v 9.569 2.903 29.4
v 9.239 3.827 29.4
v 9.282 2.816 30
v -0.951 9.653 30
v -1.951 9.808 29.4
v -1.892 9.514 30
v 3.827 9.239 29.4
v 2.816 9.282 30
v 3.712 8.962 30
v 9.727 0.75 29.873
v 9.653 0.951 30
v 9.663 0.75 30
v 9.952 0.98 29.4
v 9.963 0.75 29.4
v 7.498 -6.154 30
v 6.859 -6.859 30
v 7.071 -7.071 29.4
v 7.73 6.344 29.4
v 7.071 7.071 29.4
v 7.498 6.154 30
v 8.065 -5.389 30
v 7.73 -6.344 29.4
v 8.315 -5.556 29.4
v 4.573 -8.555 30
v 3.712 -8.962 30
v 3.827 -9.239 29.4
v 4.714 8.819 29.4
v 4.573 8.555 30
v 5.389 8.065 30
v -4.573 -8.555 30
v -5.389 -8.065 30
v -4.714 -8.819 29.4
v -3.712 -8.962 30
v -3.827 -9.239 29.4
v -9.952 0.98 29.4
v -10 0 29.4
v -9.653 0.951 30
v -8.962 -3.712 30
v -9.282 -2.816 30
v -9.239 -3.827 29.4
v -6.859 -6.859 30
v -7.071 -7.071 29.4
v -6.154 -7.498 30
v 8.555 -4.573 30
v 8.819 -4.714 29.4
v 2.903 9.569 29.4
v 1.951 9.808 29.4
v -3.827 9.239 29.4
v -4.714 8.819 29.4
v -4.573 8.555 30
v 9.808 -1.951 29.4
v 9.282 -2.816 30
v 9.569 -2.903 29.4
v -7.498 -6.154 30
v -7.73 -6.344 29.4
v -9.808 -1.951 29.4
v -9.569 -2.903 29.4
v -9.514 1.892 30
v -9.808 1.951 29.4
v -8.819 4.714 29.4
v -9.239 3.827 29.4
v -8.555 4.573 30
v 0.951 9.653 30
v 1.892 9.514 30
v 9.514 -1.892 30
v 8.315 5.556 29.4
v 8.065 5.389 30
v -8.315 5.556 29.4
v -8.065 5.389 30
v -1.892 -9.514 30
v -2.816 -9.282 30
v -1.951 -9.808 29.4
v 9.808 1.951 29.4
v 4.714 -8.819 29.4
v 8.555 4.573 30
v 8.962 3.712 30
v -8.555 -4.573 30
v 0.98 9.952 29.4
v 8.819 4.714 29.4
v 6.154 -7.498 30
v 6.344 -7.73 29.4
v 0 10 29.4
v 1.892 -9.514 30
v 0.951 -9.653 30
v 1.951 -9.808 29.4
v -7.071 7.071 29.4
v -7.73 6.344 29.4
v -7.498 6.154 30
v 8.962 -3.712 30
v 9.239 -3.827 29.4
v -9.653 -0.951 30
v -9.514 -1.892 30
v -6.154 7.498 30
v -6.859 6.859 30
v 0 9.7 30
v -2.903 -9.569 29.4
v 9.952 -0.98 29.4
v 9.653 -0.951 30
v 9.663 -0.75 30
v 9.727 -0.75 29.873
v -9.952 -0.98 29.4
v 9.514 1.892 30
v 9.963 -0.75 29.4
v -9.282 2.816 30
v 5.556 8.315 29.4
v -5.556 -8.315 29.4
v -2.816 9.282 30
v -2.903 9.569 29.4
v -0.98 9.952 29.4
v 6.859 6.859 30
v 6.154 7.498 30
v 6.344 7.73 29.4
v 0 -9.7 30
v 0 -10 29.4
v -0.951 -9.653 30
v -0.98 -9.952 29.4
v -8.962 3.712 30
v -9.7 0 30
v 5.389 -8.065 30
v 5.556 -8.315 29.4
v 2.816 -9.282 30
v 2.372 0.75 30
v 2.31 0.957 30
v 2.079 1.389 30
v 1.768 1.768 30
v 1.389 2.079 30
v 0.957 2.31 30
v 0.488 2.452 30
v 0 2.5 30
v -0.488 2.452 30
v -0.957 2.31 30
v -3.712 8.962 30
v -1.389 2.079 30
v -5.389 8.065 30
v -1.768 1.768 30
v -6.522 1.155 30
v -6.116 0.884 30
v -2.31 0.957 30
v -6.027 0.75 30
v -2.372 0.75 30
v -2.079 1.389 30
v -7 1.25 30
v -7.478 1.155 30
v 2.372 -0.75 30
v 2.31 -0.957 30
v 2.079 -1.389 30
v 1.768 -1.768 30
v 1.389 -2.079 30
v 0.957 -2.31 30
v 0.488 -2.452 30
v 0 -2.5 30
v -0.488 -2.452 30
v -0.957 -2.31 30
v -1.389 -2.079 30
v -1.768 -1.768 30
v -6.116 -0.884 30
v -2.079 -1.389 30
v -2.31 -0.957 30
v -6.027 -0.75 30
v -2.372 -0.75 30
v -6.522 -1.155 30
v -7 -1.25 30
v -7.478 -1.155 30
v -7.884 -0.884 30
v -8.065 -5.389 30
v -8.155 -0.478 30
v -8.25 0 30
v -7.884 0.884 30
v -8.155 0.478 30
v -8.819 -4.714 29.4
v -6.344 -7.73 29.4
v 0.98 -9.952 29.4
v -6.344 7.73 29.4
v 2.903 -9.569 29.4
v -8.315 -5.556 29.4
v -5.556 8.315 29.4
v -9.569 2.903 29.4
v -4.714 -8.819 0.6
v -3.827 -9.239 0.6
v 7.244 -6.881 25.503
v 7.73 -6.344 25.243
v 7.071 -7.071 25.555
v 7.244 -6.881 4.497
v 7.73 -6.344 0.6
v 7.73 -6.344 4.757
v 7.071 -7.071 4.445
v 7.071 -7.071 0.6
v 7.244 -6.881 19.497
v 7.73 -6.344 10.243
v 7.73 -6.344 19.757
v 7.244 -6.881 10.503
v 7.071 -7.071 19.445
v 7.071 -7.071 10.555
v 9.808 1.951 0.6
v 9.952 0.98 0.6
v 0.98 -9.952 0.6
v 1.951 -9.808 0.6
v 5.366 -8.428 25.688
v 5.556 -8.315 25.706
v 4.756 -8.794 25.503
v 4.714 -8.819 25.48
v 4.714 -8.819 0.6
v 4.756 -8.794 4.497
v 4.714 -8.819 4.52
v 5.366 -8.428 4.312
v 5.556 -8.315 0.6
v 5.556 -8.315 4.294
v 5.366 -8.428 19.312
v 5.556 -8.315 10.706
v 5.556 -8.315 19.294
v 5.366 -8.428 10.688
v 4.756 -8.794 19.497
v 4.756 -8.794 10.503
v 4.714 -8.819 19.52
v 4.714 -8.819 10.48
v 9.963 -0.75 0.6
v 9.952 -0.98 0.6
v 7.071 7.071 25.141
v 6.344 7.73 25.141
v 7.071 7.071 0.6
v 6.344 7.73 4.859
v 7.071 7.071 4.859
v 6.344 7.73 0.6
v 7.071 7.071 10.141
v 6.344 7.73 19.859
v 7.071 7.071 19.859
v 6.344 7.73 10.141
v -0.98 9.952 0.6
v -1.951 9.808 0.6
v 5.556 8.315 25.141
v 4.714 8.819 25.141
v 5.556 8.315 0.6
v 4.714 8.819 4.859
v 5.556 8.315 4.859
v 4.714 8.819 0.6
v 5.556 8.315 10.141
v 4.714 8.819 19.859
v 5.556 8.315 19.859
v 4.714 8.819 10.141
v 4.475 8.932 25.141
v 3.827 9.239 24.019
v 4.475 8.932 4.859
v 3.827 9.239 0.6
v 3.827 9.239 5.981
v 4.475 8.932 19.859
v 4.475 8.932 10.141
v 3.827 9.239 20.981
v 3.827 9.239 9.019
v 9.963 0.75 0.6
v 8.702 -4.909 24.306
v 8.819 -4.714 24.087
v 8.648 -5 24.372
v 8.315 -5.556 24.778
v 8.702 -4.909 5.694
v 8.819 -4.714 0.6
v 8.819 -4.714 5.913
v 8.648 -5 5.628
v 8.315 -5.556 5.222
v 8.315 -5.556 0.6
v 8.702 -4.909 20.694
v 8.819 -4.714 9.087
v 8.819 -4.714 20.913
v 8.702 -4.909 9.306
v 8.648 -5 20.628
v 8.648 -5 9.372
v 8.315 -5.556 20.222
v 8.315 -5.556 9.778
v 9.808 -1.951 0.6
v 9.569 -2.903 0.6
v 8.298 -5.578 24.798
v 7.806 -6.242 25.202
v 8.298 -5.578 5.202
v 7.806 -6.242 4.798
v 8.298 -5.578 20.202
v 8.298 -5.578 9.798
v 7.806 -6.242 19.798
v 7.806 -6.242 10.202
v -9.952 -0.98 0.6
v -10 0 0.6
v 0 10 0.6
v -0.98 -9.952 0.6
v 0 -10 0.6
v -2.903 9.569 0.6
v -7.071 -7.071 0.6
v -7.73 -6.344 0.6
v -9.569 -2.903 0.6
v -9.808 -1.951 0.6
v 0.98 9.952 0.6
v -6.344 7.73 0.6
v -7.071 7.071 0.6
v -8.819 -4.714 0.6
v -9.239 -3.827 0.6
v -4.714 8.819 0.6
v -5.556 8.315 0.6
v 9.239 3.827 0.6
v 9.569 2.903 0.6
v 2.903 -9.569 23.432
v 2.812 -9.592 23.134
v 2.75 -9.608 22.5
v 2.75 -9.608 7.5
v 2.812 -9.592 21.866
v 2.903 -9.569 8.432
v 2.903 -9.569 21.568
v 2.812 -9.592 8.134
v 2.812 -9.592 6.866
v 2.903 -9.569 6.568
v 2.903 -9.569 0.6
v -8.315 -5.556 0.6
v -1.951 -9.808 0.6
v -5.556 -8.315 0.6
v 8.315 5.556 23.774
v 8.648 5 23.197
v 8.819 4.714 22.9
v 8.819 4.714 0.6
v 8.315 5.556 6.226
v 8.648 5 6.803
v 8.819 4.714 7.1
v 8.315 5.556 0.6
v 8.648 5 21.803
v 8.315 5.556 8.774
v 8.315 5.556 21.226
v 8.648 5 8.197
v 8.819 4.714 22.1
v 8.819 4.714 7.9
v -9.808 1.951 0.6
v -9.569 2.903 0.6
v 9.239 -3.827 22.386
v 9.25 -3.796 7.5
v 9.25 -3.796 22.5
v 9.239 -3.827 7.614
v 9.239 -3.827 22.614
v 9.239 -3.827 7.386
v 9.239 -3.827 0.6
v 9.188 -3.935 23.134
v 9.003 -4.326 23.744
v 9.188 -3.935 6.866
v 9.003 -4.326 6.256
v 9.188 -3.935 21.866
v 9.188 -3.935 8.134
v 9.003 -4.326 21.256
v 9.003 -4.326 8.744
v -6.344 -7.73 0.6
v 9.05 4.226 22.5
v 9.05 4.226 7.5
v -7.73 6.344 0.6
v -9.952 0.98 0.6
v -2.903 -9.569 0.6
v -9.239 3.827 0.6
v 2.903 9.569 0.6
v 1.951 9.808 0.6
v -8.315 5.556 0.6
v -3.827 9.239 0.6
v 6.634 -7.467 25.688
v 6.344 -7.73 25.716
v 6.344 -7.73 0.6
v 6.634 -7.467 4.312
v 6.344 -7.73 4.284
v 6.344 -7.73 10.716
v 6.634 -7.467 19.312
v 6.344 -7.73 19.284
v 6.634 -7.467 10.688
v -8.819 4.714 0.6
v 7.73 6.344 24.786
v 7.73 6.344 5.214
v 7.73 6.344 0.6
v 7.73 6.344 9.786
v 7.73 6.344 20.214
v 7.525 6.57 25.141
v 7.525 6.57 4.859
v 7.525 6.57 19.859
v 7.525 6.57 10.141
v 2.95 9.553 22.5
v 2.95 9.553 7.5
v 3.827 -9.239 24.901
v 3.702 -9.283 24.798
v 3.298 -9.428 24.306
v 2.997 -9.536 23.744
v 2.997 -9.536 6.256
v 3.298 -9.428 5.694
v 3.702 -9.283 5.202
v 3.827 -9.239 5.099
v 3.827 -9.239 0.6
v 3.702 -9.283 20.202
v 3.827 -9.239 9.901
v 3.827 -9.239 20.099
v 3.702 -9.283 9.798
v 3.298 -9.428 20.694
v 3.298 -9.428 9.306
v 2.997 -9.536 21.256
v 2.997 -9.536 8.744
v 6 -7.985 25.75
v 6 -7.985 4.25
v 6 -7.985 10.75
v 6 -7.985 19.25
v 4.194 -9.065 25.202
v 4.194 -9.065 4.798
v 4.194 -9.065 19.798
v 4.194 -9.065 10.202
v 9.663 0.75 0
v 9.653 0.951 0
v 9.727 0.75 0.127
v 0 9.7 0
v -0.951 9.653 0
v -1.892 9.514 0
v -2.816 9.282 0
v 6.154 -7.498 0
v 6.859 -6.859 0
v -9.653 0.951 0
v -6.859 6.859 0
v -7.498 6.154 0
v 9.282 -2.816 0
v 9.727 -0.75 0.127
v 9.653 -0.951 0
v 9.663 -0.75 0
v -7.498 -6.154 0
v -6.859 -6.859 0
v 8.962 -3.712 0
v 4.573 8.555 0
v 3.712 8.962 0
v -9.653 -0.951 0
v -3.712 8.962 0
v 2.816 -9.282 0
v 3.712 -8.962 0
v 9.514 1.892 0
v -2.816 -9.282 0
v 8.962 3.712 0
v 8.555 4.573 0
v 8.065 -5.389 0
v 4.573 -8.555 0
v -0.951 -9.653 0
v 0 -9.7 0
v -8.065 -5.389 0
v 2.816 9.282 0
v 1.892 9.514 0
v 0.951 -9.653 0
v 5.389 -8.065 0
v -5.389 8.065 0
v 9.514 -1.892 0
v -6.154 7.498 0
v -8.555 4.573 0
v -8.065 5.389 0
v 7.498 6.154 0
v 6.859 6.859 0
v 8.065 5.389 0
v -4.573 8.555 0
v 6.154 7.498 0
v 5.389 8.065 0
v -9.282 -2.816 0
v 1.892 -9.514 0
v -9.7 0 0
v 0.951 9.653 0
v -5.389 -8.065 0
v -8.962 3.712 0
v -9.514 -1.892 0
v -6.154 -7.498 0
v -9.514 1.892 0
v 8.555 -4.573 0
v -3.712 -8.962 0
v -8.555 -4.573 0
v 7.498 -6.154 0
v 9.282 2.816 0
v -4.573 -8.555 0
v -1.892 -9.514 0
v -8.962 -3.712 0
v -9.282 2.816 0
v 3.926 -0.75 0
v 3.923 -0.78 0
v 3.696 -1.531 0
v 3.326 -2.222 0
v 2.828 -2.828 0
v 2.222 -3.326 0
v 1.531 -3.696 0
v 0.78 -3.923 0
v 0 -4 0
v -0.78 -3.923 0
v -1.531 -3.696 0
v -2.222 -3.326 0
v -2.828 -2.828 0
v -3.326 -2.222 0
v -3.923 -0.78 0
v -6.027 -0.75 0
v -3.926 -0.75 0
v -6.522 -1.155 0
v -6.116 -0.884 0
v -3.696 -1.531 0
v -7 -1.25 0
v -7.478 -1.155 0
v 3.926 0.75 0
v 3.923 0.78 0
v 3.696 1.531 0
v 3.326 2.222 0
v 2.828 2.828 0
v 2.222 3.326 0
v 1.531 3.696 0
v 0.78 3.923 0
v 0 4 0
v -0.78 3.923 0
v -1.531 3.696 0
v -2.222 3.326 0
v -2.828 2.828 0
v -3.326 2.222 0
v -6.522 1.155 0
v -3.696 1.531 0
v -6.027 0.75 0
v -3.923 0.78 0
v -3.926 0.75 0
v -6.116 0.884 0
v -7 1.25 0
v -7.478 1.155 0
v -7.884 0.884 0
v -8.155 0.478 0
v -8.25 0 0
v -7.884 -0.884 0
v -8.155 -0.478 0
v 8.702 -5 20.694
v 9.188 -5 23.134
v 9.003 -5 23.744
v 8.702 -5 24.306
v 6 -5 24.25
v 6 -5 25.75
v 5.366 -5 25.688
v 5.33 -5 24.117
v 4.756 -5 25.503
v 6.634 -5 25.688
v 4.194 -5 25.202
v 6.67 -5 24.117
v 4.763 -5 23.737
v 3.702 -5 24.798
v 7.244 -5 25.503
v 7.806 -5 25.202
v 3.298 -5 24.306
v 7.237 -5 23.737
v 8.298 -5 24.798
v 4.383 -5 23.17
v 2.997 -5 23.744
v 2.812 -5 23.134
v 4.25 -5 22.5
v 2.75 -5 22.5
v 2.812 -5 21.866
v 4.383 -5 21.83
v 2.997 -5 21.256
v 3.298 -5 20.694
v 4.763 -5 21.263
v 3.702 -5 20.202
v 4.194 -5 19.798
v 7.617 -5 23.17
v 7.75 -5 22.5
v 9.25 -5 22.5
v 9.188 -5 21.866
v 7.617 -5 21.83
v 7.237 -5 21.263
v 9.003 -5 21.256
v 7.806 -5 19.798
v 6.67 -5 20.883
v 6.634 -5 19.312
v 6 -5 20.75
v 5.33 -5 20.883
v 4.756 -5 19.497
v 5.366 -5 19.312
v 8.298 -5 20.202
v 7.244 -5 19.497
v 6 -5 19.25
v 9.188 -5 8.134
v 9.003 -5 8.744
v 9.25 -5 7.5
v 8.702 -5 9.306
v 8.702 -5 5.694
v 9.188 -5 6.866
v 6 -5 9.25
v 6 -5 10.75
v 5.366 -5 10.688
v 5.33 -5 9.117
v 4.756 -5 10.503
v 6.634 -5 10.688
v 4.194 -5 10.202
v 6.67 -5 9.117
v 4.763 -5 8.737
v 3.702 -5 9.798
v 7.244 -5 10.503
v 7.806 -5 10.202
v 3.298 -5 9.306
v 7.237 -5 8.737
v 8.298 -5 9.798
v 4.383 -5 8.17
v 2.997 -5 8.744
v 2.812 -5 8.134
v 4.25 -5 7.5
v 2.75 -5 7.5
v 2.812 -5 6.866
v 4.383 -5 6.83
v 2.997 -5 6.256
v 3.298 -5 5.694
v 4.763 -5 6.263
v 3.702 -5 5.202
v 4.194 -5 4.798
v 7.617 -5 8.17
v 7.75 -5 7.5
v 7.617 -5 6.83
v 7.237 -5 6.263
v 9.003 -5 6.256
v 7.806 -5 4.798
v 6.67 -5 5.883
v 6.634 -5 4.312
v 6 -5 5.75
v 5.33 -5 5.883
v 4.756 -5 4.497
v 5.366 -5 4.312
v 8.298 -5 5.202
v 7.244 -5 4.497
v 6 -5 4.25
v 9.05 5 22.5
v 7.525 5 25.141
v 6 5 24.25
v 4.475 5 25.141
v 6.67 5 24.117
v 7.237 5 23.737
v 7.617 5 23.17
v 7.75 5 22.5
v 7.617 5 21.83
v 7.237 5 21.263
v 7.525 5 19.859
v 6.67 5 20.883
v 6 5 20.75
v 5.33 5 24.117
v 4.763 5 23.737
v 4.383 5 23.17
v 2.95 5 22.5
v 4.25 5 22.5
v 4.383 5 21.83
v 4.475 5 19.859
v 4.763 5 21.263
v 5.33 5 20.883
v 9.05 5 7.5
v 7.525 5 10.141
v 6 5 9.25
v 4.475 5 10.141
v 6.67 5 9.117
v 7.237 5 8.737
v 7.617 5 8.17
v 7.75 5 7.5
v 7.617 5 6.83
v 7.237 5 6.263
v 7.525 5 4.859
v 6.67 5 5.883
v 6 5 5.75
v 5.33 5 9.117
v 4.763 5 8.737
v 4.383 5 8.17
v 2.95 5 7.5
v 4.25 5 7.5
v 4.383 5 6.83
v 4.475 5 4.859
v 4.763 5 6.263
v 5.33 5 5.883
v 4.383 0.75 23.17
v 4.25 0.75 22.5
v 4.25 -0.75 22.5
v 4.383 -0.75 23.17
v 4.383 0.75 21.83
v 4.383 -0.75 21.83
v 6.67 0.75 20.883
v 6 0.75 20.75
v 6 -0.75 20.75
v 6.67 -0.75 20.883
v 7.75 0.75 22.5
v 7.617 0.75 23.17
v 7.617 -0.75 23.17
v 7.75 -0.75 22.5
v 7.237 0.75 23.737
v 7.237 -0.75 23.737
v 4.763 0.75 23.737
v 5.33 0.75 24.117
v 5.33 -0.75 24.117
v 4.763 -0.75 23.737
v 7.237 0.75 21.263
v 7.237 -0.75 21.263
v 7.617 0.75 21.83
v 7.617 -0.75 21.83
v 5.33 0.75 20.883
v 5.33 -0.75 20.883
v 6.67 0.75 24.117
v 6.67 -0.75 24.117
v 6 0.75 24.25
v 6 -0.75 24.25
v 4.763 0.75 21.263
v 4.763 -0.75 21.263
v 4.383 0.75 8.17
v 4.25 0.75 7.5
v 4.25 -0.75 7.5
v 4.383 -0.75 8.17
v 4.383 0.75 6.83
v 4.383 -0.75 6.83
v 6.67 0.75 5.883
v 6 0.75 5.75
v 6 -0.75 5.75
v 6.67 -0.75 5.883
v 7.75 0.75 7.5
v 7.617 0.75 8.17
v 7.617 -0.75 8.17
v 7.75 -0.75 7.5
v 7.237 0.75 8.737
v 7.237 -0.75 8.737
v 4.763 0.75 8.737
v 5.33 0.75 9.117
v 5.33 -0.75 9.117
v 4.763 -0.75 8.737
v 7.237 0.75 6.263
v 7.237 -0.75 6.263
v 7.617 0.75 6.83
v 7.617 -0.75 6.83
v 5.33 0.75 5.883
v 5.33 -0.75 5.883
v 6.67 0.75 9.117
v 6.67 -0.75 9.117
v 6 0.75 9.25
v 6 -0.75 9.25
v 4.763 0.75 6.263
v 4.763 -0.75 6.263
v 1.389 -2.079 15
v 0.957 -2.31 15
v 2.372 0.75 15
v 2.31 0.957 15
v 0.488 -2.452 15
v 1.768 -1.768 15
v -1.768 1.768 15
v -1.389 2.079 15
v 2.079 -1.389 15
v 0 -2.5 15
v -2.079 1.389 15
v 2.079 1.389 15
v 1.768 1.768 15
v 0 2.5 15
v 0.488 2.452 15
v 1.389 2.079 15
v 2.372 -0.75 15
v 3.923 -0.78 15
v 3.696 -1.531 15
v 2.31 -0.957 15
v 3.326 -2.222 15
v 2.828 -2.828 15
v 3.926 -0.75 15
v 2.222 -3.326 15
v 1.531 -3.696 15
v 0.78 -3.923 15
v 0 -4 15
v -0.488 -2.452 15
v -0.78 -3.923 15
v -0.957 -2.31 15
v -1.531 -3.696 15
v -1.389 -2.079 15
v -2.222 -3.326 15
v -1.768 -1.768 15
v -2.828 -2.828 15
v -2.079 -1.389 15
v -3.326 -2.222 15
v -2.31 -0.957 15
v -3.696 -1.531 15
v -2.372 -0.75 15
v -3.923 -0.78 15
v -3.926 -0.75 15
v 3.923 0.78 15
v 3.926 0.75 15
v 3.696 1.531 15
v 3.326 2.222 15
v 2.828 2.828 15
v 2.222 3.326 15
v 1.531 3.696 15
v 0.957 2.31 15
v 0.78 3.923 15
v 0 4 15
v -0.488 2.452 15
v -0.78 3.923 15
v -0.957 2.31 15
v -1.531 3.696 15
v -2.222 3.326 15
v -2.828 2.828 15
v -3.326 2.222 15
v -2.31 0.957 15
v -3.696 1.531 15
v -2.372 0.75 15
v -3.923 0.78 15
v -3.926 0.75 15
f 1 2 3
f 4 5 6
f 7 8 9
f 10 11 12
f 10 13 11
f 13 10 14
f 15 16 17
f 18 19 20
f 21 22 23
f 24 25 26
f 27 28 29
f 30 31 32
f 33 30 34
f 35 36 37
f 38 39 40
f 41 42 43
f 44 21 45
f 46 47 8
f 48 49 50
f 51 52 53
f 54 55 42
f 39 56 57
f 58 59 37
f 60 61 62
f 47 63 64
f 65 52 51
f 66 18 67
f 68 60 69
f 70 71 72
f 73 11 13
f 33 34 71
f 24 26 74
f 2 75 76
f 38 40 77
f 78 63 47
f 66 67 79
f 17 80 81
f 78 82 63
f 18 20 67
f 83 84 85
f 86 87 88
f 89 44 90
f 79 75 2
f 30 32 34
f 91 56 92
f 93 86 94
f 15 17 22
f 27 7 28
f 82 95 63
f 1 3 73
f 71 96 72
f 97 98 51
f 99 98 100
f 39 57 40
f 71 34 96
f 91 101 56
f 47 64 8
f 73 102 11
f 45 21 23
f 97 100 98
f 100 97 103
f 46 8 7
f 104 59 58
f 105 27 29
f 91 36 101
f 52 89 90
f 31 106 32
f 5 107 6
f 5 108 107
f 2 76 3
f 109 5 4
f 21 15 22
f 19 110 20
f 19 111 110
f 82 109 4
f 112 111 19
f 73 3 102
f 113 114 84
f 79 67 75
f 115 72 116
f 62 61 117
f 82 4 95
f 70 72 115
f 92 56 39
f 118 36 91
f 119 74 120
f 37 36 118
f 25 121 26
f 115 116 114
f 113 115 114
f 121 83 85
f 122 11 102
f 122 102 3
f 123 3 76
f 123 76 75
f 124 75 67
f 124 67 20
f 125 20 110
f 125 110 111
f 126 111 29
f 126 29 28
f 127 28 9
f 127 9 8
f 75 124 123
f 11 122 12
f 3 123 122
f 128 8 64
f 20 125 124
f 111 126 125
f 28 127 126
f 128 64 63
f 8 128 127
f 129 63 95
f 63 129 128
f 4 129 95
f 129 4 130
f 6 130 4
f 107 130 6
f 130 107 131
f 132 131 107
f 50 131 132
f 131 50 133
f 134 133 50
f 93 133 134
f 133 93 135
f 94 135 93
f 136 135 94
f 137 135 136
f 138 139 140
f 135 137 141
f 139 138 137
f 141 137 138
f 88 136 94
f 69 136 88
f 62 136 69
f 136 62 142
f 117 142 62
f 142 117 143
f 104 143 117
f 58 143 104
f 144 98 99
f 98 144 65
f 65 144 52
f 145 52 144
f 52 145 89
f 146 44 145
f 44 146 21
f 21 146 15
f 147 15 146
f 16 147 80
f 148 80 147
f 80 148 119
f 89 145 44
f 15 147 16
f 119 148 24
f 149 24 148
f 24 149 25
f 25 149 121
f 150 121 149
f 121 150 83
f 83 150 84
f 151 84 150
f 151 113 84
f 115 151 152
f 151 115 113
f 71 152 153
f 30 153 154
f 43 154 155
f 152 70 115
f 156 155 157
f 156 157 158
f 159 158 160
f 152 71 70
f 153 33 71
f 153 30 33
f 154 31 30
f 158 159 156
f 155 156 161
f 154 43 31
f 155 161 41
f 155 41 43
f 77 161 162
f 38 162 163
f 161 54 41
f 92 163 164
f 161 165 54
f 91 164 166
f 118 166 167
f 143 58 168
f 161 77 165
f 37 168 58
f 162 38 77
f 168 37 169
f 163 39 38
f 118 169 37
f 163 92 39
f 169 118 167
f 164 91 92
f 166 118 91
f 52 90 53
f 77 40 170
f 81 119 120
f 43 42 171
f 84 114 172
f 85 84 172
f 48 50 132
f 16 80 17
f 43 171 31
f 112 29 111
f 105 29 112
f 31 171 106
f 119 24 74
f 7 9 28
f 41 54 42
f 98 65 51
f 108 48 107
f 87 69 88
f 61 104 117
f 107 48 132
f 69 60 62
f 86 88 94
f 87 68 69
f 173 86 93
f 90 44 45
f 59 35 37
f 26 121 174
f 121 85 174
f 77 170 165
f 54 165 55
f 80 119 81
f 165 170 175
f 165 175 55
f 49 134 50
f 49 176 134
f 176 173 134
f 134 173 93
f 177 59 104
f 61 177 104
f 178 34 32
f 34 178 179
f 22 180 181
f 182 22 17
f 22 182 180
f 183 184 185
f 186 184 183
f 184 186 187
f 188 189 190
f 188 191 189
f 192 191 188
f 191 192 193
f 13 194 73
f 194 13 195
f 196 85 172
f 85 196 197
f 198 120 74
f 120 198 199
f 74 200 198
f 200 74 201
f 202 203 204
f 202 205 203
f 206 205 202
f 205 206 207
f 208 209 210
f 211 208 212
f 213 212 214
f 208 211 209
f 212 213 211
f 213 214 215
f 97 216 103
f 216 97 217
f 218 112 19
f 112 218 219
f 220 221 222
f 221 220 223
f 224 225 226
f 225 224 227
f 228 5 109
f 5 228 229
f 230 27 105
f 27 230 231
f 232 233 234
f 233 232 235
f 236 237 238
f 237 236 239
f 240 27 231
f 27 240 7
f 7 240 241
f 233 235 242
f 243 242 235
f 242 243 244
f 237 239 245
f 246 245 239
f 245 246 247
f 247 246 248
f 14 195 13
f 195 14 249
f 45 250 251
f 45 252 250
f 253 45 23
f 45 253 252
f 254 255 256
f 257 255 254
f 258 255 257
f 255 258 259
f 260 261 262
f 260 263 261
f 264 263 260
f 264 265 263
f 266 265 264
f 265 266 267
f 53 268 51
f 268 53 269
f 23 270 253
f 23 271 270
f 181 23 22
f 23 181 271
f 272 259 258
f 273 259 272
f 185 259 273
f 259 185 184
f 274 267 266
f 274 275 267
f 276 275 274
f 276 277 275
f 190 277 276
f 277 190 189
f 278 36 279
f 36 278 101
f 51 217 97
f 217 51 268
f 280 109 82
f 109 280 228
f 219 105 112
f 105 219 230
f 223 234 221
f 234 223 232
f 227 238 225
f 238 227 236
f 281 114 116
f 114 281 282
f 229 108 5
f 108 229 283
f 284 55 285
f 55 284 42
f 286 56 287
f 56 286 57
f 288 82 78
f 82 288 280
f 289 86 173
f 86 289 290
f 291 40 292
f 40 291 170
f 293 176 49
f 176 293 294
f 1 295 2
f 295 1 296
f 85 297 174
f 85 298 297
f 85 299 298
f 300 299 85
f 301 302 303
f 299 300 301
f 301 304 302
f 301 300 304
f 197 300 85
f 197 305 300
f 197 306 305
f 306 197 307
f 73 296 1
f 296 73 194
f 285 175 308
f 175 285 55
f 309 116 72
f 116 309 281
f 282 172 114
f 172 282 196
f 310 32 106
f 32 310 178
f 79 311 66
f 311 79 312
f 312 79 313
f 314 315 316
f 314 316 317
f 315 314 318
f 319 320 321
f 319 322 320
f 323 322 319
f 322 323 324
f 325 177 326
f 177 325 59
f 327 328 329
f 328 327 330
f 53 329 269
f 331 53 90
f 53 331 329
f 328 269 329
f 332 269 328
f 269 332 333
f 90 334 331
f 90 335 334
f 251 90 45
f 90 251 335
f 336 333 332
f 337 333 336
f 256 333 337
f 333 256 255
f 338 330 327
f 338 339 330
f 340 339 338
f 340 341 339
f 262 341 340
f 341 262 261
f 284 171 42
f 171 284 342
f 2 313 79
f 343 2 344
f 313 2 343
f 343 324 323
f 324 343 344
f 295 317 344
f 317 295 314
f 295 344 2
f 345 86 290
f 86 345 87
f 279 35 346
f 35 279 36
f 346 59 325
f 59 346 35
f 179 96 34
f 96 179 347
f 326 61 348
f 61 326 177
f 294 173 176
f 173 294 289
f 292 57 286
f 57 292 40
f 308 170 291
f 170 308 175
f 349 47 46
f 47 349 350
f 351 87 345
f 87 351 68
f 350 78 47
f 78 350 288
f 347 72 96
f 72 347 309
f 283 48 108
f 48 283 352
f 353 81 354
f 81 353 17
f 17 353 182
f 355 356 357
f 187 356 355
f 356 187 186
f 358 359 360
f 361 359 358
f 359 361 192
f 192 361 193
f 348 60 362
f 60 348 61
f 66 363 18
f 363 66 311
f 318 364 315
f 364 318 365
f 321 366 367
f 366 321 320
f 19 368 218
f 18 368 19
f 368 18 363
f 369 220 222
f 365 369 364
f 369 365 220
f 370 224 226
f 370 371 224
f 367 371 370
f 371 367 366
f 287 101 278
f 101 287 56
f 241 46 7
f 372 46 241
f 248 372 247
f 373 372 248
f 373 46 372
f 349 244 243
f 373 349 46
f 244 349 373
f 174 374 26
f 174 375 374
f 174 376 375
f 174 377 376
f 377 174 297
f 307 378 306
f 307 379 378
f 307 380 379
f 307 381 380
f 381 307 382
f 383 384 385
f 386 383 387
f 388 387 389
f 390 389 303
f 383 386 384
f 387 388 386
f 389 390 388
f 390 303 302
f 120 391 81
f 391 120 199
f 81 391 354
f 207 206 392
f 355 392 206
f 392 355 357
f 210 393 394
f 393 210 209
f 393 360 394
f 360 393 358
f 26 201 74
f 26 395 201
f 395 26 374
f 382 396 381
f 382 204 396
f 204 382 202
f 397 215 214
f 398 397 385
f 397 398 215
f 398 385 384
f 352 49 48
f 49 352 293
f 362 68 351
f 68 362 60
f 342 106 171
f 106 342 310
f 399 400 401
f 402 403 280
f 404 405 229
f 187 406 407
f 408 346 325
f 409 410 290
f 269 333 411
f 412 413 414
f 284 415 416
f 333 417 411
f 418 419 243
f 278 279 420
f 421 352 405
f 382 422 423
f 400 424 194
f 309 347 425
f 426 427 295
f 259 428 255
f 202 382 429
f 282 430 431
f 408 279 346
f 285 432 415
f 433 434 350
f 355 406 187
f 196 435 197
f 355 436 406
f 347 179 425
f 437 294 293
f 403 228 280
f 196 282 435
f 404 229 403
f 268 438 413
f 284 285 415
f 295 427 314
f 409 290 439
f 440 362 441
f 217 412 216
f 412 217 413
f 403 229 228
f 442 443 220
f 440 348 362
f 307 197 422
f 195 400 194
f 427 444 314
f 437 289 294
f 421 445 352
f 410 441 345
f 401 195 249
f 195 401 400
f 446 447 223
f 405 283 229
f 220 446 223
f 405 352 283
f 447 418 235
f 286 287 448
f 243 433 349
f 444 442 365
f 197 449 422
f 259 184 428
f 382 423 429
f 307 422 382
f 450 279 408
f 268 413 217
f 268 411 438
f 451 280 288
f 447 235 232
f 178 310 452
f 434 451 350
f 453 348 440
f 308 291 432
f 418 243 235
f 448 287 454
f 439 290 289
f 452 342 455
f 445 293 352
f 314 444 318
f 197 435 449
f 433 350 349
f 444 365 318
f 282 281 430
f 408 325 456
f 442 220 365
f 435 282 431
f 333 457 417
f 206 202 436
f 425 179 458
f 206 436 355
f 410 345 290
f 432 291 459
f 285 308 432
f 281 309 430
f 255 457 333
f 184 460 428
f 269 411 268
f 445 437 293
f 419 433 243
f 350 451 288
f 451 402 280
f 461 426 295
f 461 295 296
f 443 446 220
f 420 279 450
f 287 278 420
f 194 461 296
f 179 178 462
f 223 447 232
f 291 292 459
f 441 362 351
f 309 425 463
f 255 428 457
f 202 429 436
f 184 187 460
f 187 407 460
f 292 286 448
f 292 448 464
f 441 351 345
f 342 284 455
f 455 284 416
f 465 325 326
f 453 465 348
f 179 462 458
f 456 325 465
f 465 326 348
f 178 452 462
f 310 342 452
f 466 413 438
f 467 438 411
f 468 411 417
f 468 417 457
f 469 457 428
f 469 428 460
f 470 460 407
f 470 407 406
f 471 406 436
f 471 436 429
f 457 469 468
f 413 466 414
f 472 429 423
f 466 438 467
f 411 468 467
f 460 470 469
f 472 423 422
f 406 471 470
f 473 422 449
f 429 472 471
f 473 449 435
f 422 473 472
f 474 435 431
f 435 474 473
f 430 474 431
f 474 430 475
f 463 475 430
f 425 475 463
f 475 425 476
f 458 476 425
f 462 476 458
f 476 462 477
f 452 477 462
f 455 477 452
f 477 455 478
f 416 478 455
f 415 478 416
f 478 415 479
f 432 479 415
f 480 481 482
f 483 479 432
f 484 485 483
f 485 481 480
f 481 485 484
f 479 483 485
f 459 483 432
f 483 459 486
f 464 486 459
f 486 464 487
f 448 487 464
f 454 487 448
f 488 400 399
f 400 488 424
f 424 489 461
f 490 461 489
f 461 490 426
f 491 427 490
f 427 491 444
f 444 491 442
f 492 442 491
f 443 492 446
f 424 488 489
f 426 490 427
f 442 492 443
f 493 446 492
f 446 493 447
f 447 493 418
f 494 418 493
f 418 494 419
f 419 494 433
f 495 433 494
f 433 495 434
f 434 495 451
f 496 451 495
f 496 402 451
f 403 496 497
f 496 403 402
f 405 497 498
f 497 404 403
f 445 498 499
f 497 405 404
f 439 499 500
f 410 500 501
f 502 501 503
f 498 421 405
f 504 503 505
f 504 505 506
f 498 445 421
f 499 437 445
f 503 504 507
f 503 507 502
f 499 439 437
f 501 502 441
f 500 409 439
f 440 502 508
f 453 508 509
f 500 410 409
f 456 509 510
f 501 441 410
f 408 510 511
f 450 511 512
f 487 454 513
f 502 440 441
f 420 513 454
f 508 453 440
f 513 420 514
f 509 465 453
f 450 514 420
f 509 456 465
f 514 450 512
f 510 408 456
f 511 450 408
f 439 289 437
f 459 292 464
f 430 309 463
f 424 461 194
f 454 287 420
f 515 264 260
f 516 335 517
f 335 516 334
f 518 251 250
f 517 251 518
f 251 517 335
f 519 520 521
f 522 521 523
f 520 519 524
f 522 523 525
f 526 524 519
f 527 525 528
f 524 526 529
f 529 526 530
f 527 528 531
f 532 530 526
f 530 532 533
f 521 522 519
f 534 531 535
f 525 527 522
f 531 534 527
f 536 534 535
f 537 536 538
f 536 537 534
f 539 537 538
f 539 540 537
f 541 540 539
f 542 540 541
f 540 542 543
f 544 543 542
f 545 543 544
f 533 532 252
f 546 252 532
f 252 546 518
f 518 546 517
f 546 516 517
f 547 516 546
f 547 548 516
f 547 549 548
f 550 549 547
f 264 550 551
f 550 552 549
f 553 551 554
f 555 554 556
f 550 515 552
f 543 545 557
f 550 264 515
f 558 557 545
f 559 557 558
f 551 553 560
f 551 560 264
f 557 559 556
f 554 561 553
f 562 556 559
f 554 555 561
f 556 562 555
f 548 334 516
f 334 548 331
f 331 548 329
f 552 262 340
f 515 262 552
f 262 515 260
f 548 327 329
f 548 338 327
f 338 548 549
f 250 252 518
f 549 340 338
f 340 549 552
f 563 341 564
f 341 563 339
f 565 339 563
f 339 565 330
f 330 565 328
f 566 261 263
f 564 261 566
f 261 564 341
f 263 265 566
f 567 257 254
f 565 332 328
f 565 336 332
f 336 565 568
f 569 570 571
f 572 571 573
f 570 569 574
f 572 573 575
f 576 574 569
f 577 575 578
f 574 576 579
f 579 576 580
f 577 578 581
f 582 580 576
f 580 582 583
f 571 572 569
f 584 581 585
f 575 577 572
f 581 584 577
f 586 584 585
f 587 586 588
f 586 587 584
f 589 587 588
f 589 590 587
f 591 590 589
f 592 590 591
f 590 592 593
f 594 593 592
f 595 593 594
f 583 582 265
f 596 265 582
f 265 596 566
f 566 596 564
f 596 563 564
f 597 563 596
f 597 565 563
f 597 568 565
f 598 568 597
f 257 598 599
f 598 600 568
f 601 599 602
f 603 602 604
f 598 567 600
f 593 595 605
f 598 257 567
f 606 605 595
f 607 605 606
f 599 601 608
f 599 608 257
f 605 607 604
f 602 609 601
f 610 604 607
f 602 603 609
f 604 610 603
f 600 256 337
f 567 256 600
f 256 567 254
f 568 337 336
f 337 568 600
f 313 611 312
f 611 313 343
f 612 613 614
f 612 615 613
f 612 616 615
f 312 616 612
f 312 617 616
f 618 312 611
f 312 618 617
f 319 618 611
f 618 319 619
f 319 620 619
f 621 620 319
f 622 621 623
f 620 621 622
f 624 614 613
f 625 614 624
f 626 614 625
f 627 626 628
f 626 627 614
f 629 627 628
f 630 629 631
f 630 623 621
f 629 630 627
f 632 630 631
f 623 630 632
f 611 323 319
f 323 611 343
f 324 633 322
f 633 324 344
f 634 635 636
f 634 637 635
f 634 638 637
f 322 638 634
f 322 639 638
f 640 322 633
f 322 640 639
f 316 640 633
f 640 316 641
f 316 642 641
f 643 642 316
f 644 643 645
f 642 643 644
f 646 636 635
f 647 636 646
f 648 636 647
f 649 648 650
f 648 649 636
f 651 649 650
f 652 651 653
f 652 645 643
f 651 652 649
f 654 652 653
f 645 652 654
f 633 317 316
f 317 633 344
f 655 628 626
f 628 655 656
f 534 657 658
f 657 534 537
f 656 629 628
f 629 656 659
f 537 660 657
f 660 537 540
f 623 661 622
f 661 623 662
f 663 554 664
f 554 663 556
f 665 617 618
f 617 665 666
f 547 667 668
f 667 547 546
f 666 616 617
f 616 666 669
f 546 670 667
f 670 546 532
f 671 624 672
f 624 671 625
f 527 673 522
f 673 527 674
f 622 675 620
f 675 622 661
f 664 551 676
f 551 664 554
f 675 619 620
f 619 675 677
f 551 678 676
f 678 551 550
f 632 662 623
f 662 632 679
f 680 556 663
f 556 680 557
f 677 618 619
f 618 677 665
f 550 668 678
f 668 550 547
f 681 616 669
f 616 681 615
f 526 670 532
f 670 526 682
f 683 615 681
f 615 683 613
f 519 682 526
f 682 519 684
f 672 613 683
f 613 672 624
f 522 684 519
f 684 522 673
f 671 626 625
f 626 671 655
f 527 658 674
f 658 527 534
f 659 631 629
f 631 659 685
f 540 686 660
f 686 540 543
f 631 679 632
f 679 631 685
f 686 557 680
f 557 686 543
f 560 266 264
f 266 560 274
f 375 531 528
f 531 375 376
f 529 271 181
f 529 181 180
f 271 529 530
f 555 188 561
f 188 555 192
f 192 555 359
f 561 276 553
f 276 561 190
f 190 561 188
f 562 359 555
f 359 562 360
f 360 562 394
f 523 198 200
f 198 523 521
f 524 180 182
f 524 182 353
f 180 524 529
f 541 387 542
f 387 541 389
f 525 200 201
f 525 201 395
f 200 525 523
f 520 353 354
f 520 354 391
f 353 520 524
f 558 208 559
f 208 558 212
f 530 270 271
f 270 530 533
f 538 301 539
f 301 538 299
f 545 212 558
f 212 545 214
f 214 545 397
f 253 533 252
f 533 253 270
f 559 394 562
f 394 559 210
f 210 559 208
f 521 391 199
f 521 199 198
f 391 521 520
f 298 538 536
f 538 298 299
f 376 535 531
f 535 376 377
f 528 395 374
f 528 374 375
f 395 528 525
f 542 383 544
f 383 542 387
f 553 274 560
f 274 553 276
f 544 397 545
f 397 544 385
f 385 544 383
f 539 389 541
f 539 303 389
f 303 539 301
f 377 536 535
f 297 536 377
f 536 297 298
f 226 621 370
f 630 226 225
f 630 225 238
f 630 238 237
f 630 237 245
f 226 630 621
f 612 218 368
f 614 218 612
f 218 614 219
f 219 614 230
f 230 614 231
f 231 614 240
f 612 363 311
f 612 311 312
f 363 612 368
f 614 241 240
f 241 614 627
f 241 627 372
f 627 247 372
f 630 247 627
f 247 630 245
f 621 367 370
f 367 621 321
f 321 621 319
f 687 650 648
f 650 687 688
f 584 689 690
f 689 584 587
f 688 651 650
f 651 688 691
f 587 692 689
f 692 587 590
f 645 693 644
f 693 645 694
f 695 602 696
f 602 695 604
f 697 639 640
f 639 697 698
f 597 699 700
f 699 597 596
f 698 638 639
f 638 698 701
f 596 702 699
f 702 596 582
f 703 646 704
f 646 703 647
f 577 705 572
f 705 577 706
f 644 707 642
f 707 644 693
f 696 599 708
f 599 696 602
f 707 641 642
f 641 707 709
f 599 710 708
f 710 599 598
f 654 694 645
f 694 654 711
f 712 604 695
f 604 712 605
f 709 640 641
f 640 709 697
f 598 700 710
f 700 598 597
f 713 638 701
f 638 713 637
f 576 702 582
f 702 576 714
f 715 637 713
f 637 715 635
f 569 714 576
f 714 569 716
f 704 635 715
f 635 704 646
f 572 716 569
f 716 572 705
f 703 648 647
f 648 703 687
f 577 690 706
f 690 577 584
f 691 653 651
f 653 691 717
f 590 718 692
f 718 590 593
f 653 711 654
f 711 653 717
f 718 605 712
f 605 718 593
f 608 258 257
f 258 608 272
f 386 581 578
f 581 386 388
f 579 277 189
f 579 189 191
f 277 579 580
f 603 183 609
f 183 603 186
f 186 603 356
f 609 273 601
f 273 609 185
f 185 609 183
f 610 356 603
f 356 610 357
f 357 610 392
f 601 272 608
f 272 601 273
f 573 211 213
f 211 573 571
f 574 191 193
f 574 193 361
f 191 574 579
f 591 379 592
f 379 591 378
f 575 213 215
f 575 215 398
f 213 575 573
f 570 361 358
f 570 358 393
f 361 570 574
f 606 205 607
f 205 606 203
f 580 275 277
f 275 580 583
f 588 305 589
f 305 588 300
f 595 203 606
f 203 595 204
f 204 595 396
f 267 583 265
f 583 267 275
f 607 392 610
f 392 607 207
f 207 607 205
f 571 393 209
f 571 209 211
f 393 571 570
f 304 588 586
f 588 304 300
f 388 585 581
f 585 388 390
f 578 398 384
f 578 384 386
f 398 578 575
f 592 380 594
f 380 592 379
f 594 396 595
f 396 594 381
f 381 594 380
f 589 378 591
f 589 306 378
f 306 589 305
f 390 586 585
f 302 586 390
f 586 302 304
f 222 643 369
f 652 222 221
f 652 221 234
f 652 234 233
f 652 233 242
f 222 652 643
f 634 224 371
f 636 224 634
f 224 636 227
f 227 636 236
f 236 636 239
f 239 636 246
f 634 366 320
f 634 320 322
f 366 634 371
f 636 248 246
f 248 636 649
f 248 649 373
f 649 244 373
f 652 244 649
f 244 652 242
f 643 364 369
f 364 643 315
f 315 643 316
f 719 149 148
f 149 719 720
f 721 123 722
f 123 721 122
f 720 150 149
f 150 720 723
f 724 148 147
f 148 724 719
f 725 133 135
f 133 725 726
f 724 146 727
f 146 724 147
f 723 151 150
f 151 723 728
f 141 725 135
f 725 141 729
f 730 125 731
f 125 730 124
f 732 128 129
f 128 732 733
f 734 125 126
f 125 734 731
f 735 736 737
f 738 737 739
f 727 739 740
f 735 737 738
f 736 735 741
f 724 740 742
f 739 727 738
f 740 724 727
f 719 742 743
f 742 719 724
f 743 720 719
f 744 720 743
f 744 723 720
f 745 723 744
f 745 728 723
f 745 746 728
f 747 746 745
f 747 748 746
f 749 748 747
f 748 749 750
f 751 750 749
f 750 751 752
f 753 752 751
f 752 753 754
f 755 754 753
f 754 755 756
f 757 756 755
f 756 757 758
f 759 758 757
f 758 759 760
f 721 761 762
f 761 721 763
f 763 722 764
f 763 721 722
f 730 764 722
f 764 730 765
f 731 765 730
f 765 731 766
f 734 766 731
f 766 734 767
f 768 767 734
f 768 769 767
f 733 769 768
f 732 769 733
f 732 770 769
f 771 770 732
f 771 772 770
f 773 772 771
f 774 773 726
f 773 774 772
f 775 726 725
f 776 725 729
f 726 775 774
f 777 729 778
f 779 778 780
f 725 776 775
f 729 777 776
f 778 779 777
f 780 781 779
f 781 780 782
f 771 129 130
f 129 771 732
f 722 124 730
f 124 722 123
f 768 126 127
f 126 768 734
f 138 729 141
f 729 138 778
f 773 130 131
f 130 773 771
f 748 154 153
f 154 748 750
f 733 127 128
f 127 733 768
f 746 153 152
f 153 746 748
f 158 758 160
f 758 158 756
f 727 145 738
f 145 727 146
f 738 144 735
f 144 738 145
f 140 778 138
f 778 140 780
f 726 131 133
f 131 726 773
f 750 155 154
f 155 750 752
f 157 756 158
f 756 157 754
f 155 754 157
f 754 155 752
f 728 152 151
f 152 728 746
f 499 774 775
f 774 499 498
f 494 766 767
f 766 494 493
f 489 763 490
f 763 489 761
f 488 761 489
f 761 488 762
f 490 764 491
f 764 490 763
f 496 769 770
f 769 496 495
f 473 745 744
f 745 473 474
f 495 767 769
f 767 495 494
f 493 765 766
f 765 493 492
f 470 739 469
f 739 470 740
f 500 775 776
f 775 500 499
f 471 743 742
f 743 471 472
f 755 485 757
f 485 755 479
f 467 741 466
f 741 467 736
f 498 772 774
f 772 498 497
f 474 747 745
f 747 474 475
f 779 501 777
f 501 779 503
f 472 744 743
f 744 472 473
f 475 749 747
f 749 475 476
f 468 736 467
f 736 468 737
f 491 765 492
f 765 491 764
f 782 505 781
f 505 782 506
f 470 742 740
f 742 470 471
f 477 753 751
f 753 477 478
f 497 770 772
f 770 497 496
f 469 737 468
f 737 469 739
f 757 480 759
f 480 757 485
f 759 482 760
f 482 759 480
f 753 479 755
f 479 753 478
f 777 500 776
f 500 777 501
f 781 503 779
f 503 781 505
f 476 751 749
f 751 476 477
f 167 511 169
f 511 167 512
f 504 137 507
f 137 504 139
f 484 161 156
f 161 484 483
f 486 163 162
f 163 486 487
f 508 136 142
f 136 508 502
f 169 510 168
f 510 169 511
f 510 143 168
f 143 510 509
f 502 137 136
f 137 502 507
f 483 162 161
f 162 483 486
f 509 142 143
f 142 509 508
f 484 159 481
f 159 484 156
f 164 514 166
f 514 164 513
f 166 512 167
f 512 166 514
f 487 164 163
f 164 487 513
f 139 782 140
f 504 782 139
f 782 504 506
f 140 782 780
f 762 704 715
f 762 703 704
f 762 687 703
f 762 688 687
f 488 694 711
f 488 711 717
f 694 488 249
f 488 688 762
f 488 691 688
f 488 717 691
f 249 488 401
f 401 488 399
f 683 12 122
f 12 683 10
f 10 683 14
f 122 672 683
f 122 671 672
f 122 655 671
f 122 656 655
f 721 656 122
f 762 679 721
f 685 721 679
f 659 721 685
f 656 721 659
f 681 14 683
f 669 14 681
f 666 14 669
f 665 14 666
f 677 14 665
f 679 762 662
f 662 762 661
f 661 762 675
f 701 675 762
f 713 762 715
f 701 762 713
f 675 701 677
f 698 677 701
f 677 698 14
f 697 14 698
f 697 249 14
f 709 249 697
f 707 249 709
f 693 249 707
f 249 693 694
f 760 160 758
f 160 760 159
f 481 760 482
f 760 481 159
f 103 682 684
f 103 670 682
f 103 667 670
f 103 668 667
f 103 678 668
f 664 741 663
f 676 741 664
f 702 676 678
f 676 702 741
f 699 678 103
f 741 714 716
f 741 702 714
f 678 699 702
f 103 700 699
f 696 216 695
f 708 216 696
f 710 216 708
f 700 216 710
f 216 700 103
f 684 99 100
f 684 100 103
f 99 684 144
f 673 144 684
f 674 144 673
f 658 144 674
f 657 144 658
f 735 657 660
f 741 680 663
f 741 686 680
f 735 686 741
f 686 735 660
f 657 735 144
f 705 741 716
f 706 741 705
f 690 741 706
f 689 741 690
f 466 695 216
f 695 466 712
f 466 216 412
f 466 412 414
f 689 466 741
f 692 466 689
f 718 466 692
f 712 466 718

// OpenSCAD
// overall height
height = 30;
// outer-diameter
od = 20;
// inner-diameter #1
id1 = 5;
// inner-diameter #2
id2 = 8;



difference() {
    union() {
        translate([0, 0, height-0.6]) cylinder(d1=od, d2=od-0.6, h=0.6, $fn=64);    // obere Fase
        translate([0, 0, 0.6]) cylinder(d=od, h=height-1.2, $fn=64);                // cylinder
        cylinder(d1=od-0.6, d2=od, h=0.6, $fn=64);                                  // untere Fase
        
        translate([max(id1, id2)/2+2, -2.5, height/4*3]) rotate([90, 0, 0]) cylinder(d=6.5, h=5, center=true, $fn=32);     // Schraubenkopf oben
        translate([max(id1, id2)/2+2, -2.5, height/4]) rotate([90, 0, 0]) cylinder(d=6.5, h=5, center=true, $fn=32);     // Schraubenkopf unten
        
        translate([max(id1, id2)/2+2, 2.5, height/4*3]) rotate([90, 0, 0]) cylinder(d=6.1, h=5, center=true, $fn=6);     // Mutter oben
        translate([max(id1, id2)/2+2, 2.5, height/4]) rotate([90, 0, 0]) cylinder(d=6.1, h=5, center=true, $fn=6);     // Mutter unten
    }
    
    translate([0, 0, height/2]) cylinder(d=id1, h=height/2, $fn=32);    // oberer id
    cylinder(d=id2, h=height/2, $fn=32);                                // unterer id
    
    loch(height/4*3);   // oberes Schraubenloch
    loch(height/4);     // unteres Schraubenloch
    
    translate([-od/4-max(id1, id2)/4, 0, 0]) cylinder(d=2.5, h=height, $fn=16); // Loch
    translate([-od/4-max(id1, id2)/4, -0.75, 0]) cube([od, 1.5, height]); // Schlitz
}

module loch(h) {
    translate([max(id1, id2)/2+2, 0, h]) rotate([90, 0, 0]) cylinder(d=3.5, h=od, center=true, $fn=16);     // Loch
    translate([max(id1, id2)/2+2, -5, h]) rotate([90, 0, 0]) cylinder(d=6.5, h=od/2, $fn=32);     // Schraubenkopf
    translate([max(id1, id2)/2+2, 5+od/2, h]) rotate([90, 0, 0]) cylinder(d=6.1, h=od/2, $fn=6);     // Mutter
}
